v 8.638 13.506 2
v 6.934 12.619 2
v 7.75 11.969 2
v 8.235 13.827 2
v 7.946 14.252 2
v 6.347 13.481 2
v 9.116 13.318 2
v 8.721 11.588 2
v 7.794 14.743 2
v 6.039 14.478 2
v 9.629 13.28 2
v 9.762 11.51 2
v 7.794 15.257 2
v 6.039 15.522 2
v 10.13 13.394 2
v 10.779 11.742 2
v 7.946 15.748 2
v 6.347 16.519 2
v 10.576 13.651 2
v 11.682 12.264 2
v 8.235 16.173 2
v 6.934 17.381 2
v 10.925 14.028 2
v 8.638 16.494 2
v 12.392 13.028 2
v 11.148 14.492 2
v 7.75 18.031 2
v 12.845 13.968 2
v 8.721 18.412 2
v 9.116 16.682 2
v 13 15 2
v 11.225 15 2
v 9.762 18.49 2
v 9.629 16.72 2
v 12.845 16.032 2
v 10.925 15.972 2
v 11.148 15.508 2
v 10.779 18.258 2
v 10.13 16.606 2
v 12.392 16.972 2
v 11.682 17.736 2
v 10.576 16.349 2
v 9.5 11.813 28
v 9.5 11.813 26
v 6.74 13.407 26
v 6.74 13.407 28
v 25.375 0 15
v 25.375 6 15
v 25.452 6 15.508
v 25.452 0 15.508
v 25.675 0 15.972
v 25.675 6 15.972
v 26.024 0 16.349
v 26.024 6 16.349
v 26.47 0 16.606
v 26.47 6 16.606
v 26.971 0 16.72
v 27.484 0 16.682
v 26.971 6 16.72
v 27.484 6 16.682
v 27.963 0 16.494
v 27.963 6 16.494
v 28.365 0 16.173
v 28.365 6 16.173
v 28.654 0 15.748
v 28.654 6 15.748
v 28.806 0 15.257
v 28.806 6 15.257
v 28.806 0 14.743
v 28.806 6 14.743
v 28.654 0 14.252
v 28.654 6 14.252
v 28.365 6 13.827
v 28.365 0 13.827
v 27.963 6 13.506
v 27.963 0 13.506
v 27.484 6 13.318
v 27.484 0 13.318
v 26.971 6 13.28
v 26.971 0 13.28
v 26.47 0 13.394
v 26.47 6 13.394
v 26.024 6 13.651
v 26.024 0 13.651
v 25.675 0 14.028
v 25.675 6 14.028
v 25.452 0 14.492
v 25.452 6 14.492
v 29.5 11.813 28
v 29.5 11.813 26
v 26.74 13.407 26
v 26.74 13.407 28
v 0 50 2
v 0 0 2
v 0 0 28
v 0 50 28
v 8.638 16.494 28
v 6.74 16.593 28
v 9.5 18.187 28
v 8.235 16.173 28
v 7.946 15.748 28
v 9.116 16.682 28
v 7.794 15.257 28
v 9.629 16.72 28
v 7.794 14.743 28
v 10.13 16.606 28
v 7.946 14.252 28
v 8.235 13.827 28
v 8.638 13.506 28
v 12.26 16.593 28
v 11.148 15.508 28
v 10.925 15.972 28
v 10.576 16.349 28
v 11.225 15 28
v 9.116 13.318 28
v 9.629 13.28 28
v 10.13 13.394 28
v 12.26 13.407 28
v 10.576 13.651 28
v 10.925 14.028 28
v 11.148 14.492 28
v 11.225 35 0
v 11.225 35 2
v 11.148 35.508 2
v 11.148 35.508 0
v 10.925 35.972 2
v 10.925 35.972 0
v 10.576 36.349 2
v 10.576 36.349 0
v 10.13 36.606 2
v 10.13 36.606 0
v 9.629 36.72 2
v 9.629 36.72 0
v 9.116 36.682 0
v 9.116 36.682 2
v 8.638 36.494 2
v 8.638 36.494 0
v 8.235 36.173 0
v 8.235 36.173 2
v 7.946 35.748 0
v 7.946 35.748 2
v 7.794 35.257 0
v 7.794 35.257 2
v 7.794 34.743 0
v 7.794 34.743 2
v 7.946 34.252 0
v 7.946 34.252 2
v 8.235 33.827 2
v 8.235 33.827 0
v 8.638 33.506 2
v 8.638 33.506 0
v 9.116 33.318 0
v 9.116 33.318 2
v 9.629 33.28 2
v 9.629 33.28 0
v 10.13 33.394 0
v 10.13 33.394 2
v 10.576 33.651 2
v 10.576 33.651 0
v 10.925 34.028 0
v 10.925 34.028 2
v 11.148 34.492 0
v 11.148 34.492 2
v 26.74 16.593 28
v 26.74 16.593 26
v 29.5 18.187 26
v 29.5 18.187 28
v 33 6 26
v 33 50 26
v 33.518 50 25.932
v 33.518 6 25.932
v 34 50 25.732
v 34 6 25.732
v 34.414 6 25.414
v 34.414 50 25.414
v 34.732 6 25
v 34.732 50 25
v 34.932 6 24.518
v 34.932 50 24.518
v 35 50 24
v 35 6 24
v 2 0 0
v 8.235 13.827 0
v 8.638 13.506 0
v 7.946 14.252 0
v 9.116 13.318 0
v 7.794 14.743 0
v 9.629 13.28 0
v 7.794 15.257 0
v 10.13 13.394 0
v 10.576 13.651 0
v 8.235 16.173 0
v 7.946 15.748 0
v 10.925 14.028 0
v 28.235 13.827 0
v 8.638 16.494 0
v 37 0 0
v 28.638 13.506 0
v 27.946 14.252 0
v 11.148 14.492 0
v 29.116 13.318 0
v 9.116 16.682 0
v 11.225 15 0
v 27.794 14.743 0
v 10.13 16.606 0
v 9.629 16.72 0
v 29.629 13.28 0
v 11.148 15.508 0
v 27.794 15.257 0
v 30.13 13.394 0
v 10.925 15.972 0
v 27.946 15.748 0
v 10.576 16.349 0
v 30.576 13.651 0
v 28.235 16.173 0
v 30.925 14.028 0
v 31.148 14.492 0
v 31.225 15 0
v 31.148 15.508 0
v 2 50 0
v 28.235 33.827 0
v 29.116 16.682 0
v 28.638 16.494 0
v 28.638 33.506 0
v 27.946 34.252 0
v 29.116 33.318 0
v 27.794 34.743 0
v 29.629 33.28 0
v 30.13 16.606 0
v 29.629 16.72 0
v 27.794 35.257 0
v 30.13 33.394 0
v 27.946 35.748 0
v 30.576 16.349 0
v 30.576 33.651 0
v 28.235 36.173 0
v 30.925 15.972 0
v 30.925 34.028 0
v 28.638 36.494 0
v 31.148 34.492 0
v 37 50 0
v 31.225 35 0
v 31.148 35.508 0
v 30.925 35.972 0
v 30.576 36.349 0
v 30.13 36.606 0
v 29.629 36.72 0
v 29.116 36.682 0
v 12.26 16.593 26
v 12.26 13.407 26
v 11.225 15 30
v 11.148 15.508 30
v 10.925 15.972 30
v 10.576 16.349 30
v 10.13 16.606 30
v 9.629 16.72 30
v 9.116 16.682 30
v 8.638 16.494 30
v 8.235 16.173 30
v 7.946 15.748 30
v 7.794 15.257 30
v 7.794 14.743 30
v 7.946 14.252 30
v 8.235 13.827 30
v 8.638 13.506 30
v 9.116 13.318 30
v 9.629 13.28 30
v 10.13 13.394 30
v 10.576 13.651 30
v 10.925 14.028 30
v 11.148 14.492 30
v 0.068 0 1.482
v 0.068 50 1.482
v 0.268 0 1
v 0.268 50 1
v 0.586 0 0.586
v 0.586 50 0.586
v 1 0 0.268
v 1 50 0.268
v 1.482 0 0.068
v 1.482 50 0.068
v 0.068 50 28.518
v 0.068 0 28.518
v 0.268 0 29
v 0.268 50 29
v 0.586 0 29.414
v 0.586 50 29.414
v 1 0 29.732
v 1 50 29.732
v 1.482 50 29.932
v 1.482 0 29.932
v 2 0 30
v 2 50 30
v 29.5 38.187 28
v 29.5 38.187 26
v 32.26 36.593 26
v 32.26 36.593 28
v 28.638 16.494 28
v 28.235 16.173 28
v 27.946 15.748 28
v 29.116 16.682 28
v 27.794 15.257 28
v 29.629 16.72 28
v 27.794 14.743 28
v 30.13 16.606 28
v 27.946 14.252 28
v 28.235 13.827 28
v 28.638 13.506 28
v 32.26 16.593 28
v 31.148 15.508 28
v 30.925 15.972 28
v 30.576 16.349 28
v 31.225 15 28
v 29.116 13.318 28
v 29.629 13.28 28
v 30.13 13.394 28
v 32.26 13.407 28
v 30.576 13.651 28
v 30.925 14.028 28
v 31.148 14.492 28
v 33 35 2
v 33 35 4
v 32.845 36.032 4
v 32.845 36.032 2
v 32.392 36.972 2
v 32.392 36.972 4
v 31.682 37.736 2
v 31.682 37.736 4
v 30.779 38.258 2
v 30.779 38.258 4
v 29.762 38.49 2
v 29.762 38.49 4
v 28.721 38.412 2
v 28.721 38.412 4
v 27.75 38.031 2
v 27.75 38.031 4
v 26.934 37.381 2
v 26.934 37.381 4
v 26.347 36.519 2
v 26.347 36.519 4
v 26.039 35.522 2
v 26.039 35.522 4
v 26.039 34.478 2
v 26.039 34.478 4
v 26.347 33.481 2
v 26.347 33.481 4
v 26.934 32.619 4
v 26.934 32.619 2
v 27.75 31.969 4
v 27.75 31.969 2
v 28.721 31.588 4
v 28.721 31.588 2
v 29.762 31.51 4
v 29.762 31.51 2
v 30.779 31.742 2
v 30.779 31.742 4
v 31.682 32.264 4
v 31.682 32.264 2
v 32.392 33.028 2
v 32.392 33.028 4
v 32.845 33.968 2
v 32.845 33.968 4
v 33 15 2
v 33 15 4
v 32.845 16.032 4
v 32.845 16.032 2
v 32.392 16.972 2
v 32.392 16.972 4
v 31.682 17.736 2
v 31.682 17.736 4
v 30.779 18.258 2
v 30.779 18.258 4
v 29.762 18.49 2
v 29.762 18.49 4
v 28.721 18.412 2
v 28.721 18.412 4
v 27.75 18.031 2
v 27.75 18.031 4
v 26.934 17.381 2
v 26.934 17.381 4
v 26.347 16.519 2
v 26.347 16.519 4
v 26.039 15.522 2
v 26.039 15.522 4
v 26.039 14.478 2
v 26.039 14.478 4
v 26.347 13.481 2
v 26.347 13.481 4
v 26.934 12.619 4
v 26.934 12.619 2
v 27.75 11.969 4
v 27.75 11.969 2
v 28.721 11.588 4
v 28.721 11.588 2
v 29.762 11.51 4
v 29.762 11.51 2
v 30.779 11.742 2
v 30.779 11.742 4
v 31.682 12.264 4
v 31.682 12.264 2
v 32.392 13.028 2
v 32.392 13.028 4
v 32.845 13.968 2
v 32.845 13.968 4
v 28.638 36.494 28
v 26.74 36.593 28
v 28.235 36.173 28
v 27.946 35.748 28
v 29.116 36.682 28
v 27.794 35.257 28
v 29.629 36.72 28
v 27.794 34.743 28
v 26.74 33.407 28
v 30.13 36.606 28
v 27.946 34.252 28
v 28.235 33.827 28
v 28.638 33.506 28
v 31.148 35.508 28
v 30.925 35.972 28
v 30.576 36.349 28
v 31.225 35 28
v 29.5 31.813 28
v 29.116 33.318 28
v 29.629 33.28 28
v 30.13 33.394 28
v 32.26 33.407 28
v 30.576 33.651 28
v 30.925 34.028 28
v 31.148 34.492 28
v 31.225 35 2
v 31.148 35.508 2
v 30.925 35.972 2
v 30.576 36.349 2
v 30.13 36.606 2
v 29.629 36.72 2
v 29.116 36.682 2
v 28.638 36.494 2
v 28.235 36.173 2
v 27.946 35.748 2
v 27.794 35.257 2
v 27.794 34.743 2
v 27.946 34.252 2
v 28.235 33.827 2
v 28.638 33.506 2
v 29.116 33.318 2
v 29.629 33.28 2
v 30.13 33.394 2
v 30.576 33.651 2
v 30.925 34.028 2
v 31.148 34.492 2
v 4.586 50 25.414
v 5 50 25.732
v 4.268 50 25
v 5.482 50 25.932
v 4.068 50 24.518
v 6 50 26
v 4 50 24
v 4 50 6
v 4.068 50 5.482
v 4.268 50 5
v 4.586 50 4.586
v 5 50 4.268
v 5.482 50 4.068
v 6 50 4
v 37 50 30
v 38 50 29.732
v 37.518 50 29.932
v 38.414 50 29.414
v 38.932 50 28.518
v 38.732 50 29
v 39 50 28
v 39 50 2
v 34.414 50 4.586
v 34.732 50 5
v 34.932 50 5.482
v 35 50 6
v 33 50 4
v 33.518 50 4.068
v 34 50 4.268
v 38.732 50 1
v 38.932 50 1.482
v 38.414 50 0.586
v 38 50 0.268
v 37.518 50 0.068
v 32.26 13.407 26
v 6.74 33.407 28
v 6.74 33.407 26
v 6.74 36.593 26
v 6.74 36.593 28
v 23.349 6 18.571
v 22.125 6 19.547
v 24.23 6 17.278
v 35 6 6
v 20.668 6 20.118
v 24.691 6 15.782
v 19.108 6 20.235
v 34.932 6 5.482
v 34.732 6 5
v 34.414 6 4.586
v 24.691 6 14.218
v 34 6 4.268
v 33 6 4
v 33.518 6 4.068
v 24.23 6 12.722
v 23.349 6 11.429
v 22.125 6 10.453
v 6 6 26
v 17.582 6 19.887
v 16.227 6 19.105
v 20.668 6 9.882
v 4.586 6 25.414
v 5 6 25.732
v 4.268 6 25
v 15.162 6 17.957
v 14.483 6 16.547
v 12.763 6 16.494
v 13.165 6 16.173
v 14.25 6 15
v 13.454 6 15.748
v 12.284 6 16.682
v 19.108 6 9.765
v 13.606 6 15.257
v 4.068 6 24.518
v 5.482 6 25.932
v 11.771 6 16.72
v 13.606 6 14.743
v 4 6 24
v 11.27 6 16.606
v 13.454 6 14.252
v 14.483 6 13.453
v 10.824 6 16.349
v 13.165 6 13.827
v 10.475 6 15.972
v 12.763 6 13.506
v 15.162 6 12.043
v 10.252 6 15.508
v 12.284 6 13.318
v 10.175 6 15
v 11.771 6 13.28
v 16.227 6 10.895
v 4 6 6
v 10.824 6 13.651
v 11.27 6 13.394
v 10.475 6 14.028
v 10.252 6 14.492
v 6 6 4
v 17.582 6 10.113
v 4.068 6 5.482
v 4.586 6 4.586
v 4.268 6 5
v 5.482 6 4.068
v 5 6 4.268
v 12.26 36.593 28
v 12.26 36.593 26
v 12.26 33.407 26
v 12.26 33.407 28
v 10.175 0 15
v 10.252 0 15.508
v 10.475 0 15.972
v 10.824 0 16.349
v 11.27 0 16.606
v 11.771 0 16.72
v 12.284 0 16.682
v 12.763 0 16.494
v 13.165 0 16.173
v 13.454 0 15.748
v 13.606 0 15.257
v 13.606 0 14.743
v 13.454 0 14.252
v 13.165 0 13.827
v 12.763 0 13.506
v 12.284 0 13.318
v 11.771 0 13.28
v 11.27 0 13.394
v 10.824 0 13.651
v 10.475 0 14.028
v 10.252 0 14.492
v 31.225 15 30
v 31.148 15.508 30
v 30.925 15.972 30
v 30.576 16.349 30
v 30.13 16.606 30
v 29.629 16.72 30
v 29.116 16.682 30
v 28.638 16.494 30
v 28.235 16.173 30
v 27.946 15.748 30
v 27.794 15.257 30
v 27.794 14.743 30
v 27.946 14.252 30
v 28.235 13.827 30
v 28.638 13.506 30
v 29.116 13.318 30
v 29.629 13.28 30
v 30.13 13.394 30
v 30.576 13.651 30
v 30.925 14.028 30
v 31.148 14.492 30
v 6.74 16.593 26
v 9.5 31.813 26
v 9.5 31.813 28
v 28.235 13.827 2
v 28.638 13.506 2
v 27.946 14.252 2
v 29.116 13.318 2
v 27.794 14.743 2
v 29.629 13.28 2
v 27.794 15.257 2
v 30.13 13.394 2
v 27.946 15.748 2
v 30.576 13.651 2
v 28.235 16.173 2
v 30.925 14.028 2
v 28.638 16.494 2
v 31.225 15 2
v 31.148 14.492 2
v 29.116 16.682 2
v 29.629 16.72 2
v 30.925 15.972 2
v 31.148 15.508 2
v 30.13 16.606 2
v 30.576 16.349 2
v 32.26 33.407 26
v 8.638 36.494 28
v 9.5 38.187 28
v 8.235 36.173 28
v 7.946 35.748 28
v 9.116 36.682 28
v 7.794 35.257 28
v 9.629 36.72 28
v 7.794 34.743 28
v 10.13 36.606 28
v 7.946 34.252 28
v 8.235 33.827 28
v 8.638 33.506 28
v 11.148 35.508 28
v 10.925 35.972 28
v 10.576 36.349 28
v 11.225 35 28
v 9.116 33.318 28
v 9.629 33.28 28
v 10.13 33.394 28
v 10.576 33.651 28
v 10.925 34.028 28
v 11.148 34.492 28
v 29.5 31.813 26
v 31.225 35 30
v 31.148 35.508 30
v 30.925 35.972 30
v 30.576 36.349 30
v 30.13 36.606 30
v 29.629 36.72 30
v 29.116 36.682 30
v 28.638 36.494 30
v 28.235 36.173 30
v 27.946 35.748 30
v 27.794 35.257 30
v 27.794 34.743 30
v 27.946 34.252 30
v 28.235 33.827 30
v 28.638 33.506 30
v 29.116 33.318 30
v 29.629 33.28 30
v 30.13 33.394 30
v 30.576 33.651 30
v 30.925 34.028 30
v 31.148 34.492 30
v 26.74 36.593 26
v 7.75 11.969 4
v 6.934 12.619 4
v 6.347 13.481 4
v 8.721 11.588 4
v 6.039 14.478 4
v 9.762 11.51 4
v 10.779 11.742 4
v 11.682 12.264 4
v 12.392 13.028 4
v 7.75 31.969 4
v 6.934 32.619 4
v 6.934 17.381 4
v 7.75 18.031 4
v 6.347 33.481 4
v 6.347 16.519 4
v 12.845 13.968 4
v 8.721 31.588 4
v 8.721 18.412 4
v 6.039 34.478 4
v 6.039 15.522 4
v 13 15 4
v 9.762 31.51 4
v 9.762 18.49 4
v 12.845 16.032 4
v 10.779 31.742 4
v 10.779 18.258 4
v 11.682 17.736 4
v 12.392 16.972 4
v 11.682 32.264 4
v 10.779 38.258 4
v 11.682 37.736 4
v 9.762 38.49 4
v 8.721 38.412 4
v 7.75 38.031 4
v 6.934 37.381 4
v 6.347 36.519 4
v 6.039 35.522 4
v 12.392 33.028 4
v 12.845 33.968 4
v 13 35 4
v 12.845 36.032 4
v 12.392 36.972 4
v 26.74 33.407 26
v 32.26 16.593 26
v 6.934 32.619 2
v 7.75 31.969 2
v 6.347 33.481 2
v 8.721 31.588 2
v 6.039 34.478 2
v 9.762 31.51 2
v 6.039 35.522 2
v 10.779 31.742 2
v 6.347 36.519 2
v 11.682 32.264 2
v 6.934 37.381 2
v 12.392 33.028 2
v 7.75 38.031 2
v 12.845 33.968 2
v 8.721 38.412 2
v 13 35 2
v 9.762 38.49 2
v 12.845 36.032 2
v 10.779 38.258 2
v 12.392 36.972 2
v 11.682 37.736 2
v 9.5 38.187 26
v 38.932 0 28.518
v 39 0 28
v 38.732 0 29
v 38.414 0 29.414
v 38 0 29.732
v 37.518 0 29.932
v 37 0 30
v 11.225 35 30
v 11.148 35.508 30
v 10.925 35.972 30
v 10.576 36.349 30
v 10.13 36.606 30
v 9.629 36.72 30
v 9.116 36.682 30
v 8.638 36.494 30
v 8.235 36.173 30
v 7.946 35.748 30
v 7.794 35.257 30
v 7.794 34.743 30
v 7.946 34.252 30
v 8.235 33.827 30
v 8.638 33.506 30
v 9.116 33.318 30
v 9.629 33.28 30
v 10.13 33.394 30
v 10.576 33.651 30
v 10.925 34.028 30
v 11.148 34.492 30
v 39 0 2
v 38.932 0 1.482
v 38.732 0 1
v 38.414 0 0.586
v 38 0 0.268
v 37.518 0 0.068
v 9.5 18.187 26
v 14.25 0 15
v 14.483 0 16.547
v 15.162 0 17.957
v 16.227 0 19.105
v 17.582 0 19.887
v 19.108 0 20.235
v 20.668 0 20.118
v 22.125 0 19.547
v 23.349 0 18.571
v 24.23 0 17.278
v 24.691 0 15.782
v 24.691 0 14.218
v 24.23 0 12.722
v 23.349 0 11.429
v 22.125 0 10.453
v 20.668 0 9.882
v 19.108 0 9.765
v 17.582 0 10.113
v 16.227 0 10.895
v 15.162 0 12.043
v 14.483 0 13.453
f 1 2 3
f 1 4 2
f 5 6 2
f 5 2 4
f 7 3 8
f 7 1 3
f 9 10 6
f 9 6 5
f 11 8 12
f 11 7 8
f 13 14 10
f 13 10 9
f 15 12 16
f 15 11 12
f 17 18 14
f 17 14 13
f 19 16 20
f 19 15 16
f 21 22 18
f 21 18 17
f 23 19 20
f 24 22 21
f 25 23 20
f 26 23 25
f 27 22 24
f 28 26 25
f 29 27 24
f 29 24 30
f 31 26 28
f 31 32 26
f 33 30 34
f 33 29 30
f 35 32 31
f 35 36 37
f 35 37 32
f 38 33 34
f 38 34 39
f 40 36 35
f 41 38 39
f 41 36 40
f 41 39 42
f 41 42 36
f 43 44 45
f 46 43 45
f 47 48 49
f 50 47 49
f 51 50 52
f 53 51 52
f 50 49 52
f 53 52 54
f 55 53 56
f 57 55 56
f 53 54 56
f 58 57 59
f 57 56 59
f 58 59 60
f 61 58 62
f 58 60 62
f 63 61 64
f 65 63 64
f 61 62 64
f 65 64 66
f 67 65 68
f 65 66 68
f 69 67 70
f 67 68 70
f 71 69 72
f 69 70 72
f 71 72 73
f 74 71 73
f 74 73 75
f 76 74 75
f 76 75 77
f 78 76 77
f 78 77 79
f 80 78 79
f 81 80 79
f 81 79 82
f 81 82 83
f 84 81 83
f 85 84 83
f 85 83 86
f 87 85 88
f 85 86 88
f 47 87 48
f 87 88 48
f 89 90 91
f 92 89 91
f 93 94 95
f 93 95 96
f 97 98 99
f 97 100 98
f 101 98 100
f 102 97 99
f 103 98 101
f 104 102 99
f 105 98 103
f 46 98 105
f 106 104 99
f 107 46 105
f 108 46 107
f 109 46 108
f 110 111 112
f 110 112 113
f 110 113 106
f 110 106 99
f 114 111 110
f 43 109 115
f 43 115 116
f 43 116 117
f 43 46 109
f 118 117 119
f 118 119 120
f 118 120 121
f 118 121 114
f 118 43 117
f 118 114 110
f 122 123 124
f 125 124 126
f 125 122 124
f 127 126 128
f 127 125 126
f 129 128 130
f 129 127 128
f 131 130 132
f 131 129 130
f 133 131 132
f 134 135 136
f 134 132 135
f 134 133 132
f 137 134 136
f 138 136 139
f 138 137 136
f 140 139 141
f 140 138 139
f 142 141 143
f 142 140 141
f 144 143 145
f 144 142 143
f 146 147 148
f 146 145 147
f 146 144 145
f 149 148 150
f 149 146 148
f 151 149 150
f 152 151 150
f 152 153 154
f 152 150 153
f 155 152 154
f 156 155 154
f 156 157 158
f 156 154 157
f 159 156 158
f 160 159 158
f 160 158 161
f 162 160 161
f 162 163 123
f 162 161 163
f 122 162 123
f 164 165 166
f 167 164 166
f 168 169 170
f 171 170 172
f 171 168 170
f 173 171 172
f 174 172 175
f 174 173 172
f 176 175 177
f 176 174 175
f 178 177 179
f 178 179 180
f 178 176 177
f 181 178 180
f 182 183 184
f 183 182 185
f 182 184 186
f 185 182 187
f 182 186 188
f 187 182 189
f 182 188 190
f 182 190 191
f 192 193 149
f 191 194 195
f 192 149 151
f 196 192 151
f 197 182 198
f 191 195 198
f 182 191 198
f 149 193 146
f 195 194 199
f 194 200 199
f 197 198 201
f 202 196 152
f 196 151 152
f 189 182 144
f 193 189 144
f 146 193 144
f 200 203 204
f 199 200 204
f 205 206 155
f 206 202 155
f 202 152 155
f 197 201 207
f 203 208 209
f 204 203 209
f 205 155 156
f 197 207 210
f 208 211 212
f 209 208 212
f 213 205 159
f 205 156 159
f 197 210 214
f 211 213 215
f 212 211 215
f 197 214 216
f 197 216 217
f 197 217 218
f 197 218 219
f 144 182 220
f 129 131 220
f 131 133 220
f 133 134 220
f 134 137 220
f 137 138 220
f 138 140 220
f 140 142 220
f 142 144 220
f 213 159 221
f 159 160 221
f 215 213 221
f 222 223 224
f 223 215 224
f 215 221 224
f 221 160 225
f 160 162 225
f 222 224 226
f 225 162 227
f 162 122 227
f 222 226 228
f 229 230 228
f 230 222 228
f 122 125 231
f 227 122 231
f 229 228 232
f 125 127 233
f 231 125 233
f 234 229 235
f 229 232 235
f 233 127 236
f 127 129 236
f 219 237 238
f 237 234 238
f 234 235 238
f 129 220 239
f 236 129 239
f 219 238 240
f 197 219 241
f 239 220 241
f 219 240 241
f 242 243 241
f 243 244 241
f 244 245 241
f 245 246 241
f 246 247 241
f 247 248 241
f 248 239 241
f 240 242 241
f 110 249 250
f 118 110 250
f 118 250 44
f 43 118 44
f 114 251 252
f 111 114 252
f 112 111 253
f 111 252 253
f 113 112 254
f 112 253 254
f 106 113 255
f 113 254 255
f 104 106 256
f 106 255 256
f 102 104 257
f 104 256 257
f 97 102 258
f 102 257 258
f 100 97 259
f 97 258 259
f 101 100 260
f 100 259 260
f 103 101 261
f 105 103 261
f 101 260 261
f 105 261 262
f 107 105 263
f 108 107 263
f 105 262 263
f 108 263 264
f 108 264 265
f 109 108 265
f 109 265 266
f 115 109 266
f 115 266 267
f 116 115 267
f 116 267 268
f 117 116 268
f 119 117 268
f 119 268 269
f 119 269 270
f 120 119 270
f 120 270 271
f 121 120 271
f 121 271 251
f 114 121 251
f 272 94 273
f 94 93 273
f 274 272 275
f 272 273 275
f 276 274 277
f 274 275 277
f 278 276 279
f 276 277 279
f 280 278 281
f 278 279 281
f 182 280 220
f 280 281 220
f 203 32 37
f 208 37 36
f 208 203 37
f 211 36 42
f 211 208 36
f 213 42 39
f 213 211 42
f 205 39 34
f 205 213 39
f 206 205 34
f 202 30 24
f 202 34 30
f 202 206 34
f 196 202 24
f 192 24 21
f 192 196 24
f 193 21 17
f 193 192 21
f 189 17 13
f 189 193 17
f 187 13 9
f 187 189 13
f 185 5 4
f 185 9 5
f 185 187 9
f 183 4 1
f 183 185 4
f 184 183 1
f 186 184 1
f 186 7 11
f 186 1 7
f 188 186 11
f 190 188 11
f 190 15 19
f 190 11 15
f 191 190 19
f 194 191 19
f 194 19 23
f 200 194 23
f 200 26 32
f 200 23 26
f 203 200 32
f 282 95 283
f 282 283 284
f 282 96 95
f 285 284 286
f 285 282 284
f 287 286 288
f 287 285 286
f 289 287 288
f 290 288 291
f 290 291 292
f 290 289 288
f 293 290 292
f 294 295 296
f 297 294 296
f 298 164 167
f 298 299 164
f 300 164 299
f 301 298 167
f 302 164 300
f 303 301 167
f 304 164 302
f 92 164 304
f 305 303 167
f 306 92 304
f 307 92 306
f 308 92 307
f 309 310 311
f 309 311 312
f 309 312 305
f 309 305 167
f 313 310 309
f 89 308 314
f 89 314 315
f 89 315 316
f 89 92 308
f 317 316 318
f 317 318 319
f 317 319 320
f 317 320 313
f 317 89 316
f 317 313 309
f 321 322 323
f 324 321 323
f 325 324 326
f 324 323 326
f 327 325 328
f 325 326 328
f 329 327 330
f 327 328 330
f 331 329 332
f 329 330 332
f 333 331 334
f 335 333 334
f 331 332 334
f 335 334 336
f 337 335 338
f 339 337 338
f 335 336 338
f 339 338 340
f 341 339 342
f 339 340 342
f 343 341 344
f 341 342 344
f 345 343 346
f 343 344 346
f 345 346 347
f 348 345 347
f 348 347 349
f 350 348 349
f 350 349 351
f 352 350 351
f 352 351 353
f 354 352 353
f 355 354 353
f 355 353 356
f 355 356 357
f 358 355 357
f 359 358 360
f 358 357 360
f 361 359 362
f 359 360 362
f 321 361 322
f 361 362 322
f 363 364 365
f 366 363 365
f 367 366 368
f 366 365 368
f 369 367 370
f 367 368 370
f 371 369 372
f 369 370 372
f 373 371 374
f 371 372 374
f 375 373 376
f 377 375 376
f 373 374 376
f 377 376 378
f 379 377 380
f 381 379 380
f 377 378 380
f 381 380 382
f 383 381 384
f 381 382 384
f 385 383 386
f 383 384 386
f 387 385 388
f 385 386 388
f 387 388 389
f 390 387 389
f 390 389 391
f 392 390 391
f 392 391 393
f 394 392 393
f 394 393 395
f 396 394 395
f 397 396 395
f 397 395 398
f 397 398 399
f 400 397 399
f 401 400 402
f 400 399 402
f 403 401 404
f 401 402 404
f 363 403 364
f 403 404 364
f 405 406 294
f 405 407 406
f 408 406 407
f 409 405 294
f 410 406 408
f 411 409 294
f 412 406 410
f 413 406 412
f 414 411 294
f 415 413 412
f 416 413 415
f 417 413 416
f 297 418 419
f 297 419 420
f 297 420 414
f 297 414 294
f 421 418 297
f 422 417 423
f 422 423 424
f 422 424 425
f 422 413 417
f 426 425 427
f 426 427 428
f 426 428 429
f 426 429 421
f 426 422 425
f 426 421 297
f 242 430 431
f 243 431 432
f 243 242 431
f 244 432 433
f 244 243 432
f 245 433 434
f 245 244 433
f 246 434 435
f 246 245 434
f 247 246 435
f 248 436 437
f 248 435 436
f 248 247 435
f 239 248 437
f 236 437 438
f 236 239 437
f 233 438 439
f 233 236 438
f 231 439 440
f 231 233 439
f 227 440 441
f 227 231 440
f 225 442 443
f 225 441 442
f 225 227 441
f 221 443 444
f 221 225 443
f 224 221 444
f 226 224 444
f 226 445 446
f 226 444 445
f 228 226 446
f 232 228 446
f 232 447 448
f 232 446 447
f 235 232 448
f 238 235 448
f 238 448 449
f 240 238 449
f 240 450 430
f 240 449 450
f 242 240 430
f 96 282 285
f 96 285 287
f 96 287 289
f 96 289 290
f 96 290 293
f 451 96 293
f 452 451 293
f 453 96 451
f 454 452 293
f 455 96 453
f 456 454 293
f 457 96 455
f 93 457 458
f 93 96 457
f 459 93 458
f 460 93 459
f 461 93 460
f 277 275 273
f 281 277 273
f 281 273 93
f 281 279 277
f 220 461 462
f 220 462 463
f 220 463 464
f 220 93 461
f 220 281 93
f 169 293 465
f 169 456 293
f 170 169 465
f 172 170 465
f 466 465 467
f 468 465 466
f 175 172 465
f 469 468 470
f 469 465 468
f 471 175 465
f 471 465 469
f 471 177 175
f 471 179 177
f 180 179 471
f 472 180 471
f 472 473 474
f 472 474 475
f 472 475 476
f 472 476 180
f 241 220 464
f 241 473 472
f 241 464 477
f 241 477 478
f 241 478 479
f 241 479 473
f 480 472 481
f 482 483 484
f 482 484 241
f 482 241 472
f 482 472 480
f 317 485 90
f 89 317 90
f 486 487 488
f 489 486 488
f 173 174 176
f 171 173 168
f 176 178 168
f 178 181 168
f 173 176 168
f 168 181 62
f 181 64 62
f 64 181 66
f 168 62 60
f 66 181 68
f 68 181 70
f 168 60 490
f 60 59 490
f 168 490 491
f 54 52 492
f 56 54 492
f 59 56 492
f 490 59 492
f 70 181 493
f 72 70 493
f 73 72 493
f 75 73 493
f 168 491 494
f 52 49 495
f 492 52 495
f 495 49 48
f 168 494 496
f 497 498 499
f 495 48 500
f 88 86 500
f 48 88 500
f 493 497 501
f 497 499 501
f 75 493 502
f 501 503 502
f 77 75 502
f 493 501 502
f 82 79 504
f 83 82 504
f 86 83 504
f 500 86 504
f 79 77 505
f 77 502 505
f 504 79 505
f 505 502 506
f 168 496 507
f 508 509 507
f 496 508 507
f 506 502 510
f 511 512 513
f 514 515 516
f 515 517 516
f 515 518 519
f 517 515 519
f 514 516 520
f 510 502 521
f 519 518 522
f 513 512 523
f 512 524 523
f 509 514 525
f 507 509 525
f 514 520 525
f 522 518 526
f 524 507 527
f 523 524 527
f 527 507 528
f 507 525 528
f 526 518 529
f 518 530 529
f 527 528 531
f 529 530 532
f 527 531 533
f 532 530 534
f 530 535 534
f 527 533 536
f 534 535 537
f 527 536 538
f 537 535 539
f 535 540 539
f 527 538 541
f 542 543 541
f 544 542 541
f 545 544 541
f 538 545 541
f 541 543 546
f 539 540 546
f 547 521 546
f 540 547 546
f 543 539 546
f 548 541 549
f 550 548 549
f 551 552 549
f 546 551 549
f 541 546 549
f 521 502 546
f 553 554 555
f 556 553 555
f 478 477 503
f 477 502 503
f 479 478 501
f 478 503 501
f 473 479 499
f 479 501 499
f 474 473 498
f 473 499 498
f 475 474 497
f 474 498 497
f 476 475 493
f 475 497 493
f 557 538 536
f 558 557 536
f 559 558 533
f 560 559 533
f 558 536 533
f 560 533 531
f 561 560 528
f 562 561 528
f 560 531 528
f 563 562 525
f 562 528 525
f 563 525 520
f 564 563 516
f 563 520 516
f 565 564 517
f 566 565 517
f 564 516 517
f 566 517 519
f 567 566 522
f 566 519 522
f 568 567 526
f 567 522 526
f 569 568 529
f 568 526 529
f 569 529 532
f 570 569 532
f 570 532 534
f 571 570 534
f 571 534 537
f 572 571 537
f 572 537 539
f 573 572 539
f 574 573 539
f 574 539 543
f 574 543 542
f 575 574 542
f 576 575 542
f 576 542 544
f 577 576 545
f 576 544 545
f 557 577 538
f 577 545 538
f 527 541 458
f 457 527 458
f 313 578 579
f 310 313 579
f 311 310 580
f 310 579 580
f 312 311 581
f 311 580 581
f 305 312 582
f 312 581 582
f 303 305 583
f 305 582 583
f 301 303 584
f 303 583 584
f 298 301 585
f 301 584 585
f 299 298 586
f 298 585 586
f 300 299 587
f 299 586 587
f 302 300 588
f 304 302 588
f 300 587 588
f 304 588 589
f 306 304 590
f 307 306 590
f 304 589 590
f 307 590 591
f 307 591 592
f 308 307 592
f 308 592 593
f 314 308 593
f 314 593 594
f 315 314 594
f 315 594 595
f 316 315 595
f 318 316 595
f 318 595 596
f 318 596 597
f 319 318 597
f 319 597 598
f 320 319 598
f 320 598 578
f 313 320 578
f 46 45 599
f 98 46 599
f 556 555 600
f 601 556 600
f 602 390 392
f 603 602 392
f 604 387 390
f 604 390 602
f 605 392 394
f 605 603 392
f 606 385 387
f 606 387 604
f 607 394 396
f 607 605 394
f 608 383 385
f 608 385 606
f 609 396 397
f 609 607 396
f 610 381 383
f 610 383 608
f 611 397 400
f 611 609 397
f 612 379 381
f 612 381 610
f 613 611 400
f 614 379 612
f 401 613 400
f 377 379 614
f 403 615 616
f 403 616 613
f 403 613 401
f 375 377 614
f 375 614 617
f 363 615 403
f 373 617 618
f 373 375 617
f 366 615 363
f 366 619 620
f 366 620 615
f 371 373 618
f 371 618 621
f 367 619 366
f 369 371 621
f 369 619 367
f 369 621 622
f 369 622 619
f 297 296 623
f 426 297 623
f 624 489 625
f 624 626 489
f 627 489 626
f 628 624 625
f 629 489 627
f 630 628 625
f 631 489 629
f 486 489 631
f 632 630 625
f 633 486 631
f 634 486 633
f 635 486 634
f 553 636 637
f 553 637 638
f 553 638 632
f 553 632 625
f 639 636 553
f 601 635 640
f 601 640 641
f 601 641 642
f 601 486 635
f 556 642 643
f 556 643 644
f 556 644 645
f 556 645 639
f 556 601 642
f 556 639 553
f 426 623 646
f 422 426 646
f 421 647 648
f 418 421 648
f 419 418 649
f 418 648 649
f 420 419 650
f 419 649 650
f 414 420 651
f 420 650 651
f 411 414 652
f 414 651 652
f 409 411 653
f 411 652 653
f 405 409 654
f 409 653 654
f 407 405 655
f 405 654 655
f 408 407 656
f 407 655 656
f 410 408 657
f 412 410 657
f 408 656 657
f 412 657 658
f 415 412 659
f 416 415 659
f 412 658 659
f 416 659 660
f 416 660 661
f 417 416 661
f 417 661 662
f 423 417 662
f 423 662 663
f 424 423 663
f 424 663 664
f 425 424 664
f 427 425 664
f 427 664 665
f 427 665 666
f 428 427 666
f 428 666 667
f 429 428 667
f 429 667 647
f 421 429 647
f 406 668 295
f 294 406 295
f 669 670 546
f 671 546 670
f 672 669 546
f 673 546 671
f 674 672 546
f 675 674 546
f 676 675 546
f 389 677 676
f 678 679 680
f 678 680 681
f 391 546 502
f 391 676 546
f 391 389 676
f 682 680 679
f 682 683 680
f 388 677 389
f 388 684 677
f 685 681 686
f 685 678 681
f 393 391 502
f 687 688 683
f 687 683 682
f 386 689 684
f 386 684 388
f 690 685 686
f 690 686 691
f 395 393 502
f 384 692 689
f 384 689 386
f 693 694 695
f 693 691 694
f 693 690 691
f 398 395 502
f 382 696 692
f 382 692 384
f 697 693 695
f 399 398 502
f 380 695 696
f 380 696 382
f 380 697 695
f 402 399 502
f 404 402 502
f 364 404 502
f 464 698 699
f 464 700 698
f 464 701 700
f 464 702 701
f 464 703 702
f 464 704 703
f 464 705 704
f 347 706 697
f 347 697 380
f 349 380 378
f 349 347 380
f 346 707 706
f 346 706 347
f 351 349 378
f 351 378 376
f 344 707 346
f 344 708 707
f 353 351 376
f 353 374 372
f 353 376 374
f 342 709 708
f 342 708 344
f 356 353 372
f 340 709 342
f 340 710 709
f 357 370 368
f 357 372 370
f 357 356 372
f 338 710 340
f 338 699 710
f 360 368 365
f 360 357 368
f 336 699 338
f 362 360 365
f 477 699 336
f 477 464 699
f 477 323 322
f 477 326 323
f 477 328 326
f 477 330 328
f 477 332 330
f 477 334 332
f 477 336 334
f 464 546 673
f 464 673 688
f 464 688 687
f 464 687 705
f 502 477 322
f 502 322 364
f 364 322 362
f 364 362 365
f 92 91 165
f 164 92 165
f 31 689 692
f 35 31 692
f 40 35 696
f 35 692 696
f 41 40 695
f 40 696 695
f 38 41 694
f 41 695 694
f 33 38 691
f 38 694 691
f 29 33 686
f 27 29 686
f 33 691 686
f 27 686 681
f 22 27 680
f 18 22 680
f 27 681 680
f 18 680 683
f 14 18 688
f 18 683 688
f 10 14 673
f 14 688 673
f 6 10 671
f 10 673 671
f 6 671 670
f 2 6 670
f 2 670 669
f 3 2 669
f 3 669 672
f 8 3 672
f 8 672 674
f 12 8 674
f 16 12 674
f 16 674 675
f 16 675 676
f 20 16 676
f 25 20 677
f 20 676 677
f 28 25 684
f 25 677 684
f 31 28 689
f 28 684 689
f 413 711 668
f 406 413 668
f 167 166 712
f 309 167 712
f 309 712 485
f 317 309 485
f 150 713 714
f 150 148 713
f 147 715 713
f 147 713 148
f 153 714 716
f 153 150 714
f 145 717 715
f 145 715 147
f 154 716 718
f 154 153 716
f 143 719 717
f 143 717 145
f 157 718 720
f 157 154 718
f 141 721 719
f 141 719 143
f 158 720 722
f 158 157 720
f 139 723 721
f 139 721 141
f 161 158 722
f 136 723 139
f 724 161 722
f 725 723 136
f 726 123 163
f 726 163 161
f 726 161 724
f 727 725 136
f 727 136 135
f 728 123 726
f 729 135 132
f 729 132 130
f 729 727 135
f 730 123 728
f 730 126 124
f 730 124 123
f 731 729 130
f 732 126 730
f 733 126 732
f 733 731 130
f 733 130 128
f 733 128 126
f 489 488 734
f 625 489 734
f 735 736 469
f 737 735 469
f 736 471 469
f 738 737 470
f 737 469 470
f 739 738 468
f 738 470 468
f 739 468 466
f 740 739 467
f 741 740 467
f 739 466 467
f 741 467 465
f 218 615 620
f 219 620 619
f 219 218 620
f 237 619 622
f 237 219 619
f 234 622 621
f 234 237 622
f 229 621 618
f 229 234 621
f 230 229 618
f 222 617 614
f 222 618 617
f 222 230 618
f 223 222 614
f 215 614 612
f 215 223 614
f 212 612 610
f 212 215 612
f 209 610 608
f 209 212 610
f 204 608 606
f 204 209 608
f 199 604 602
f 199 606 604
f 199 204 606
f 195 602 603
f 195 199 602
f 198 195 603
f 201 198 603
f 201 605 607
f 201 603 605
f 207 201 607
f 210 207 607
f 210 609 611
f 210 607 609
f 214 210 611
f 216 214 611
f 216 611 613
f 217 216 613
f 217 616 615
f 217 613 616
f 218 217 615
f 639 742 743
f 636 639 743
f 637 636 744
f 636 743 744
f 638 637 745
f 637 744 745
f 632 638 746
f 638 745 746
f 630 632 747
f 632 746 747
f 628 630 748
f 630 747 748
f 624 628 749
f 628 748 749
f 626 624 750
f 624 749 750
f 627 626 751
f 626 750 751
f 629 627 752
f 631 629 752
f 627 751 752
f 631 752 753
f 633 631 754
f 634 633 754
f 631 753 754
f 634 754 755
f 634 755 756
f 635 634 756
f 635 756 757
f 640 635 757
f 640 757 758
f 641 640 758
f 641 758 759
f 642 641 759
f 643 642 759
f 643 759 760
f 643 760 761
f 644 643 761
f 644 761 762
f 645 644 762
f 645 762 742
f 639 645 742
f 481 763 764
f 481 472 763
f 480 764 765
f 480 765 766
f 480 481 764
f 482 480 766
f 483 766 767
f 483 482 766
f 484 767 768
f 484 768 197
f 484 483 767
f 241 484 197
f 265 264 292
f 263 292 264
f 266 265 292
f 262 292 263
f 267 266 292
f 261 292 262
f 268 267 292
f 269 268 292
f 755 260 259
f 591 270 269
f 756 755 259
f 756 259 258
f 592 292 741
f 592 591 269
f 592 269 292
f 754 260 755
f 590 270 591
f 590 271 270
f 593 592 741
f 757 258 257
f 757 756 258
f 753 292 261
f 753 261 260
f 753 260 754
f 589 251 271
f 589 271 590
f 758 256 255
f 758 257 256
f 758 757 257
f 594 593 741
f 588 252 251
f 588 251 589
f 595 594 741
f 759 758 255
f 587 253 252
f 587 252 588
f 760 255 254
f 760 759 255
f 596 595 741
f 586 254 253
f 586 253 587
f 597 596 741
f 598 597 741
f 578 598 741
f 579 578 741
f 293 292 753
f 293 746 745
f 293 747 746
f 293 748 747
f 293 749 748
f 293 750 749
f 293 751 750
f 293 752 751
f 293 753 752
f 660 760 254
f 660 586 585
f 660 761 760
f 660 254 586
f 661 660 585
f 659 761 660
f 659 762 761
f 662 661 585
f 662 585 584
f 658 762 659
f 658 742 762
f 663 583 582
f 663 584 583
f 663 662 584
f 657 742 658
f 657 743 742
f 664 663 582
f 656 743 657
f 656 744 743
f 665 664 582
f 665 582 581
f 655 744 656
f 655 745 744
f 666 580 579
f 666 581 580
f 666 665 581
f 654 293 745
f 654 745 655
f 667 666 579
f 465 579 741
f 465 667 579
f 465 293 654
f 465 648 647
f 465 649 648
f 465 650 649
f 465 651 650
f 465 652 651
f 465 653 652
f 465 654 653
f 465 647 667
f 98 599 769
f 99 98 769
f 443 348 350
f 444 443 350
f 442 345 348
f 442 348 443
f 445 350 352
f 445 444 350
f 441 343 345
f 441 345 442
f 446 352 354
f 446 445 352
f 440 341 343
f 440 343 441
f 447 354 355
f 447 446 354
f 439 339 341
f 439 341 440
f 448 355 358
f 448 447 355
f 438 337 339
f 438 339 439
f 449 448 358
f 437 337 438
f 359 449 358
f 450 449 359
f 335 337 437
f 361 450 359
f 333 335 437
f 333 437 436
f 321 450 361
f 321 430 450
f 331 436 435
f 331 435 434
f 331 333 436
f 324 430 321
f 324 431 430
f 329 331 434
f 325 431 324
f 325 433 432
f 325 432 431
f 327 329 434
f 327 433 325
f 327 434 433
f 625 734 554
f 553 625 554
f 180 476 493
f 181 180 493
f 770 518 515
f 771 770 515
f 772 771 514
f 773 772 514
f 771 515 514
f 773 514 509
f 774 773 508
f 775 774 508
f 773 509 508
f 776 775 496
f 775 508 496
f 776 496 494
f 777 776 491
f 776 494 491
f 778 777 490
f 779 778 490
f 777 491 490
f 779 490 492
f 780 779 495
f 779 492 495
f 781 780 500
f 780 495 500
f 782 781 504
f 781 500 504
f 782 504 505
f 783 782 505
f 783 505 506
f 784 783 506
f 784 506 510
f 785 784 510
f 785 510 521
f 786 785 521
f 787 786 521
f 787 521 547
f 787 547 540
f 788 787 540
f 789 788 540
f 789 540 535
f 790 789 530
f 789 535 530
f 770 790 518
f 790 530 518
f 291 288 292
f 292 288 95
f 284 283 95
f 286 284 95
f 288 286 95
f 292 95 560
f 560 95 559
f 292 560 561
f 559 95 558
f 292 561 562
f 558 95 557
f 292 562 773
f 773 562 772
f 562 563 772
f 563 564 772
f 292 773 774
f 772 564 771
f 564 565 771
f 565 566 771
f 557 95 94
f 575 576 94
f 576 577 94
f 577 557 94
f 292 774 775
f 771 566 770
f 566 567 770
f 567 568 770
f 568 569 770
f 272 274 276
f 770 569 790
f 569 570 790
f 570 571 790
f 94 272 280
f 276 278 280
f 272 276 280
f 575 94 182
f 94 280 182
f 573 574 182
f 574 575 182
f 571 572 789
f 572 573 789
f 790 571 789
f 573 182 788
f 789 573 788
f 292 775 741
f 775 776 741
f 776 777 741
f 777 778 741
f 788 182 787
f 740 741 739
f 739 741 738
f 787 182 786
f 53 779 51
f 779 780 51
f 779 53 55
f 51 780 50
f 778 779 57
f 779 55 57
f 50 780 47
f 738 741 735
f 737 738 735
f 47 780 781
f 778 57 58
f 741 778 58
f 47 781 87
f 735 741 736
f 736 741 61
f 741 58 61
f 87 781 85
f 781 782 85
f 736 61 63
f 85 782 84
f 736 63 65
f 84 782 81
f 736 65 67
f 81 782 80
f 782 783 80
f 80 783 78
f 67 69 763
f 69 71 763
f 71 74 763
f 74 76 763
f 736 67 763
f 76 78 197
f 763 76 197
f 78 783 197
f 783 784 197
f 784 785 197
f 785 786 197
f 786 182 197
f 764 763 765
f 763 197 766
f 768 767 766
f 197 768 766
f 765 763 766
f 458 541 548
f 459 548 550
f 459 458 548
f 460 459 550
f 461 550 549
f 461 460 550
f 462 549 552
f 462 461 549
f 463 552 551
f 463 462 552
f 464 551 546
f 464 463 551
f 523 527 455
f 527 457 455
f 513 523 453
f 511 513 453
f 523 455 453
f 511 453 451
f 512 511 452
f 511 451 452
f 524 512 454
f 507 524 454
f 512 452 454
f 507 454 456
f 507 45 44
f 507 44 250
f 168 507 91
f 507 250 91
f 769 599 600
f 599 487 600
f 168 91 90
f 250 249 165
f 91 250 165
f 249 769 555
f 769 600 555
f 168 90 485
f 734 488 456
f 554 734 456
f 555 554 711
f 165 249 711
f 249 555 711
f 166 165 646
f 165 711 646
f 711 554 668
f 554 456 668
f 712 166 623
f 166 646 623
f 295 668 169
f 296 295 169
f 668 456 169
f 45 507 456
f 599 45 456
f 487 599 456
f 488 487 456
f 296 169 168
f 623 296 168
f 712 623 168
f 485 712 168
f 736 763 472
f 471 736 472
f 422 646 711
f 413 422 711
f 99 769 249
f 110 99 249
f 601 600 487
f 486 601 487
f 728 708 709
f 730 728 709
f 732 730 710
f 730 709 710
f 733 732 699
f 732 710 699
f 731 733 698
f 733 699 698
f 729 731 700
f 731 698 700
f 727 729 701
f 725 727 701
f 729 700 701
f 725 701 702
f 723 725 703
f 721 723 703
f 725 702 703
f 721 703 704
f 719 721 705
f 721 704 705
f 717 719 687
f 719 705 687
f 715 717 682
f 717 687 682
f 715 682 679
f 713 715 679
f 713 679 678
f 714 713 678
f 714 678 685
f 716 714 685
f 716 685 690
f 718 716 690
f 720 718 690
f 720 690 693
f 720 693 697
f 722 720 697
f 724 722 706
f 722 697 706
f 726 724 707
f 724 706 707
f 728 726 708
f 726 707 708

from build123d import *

# Parameters (mm, degrees)
F0_W      = 39
F0_H      = 50
F0_R      = 3.5
F0_R_2    = 1.725
F1_DEPTH  = 4
F2_R      = 3.5
F3_DEPTH  = 2
F5_DEPTH  = 22
F6_R      = 5.25
F6_R_2    = 1.725
F7_DEPTH  = 6
F8_W      = 39
F8_H      = 50
F9_DEPTH  = 4
F10_R     = 1.99999
F11_R     = 1.725
F12_DEPTH = 4
F14_DEPTH = 2


# Not quite as in the source:
# - a fillet or chamfer is up to 0.001 mm smaller than in the source, because OpenCascade refuses the exact size


with BuildPart() as f1:
    # F0 (on Top) → F1 (new body)
    with BuildSketch(Plane.XY):
        with Locations((19.5, 25)):
            Rectangle(F0_W, F0_H)
        with Locations((9.5, 15)):
            Circle(F0_R, mode=Mode.SUBTRACT)
        with Locations((29.5, 15)):
            Circle(F0_R, mode=Mode.SUBTRACT)
        with Locations((9.5, 35)):
            Circle(F0_R, mode=Mode.SUBTRACT)
        with Locations((29.5, 35)):
            Circle(F0_R, mode=Mode.SUBTRACT)
        with Locations((9.5, 35)):
            Circle(F0_R)
        with Locations((9.5, 35)):
            Circle(F0_R_2, mode=Mode.SUBTRACT)
        with Locations((29.5, 35)):
            Circle(F0_R)
        with Locations((29.5, 35)):
            Circle(F0_R_2, mode=Mode.SUBTRACT)
        with Locations((29.5, 15)):
            Circle(F0_R)
        with Locations((29.5, 15)):
            Circle(F0_R_2, mode=Mode.SUBTRACT)
        with Locations((9.5, 15)):
            Circle(F0_R)
        with Locations((9.5, 15)):
            Circle(F0_R_2, mode=Mode.SUBTRACT)
    extrude(amount=F1_DEPTH)

    # F2 (on face) → F3 (cut)
    with BuildSketch(Plane.XY.offset(4)):
        with Locations((9.5, 35)):
            Circle(F2_R)
        with Locations((29.5, 35)):
            Circle(F2_R)
        with Locations((29.5, 15)):
            Circle(F2_R)
        with Locations((9.5, 15)):
            Circle(F2_R)
    extrude(amount=-F3_DEPTH, mode=Mode.SUBTRACT)

    # F4 (on face) → F5 (join)
    with BuildSketch(Plane.XY.offset(4)):
        Polygon((4, 50), (0, 50), (0, 0), (39, 0), (39, 50), (35, 50), (35, 6), (4, 6), align=None)
    extrude(amount=F5_DEPTH)

    # F6 (on face) → F7 (cut, through all)
    with BuildSketch(Plane(origin=(0, 6, 0), x_dir=(-1, 0, 0), z_dir=(0, 1, 0))):
        with Locations((-19.5, 15)):
            Circle(F6_R)
        with Locations((-27.1, 15)):
            Circle(F6_R_2)
        with Locations((-11.9, 15)):
            Circle(F6_R_2)
    extrude(amount=-F7_DEPTH, mode=Mode.SUBTRACT)

    # F8 (on face) → F9 (join)
    with BuildSketch(Plane.XY.offset(26)):
        with Locations((19.5, 25)):
            Rectangle(F8_W, F8_H)
    extrude(amount=F9_DEPTH)

    # F10 (radius 2 in the source; OpenCascade refuses exactly that, so slightly less here)
    f10_edges = [f1.edges().sort_by_distance(p)[0] for p in [
        (0, 25, 30),
        (0, 25, 0),
        (39, 25, 0),
        (39, 25, 30),
        (35, 28, 26),
        (4, 28, 26),
        (4, 28, 4),
        (35, 28, 4),
    ]]
    fillet(f10_edges, radius=F10_R)

    # F11 (on face) → F12 (cut, through all)
    with BuildSketch(Plane.XY.offset(30)):
        with Locations((9.5, 35)):
            Circle(F11_R)
        with Locations((29.5, 35)):
            Circle(F11_R)
        with Locations((29.5, 15)):
            Circle(F11_R)
        with Locations((9.5, 15)):
            Circle(F11_R)
    extrude(amount=-F12_DEPTH, mode=Mode.SUBTRACT)

    # F13 (on face) → F14 (cut)
    with BuildSketch(Plane(origin=(0, 0, 26), x_dir=(1, 0, 0), z_dir=(0, 0, -1))):
        Polygon((12.26, -13.406513257), (9.5, -11.8130265141), (6.74, -13.406513257), (6.74, -16.593486743), (9.5, -18.1869734859), (12.26, -16.593486743), align=None)
        Polygon((32.26, -13.406513257), (29.5, -11.8130265141), (26.74, -13.406513257), (26.74, -16.593486743), (29.5, -18.1869734859), (32.26, -16.593486743), align=None)
        Polygon((32.26, -33.406513257), (29.5, -31.8130265141), (26.74, -33.406513257), (26.74, -36.593486743), (29.5, -38.1869734859), (32.26, -36.593486743), align=None)
        Polygon((12.26, -33.406513257), (9.5, -31.8130265141), (6.74, -33.406513257), (6.74, -36.593486743), (9.5, -38.1869734859), (12.26, -36.593486743), align=None)
    extrude(amount=-F14_DEPTH, mode=Mode.SUBTRACT)


solid = f1.part
